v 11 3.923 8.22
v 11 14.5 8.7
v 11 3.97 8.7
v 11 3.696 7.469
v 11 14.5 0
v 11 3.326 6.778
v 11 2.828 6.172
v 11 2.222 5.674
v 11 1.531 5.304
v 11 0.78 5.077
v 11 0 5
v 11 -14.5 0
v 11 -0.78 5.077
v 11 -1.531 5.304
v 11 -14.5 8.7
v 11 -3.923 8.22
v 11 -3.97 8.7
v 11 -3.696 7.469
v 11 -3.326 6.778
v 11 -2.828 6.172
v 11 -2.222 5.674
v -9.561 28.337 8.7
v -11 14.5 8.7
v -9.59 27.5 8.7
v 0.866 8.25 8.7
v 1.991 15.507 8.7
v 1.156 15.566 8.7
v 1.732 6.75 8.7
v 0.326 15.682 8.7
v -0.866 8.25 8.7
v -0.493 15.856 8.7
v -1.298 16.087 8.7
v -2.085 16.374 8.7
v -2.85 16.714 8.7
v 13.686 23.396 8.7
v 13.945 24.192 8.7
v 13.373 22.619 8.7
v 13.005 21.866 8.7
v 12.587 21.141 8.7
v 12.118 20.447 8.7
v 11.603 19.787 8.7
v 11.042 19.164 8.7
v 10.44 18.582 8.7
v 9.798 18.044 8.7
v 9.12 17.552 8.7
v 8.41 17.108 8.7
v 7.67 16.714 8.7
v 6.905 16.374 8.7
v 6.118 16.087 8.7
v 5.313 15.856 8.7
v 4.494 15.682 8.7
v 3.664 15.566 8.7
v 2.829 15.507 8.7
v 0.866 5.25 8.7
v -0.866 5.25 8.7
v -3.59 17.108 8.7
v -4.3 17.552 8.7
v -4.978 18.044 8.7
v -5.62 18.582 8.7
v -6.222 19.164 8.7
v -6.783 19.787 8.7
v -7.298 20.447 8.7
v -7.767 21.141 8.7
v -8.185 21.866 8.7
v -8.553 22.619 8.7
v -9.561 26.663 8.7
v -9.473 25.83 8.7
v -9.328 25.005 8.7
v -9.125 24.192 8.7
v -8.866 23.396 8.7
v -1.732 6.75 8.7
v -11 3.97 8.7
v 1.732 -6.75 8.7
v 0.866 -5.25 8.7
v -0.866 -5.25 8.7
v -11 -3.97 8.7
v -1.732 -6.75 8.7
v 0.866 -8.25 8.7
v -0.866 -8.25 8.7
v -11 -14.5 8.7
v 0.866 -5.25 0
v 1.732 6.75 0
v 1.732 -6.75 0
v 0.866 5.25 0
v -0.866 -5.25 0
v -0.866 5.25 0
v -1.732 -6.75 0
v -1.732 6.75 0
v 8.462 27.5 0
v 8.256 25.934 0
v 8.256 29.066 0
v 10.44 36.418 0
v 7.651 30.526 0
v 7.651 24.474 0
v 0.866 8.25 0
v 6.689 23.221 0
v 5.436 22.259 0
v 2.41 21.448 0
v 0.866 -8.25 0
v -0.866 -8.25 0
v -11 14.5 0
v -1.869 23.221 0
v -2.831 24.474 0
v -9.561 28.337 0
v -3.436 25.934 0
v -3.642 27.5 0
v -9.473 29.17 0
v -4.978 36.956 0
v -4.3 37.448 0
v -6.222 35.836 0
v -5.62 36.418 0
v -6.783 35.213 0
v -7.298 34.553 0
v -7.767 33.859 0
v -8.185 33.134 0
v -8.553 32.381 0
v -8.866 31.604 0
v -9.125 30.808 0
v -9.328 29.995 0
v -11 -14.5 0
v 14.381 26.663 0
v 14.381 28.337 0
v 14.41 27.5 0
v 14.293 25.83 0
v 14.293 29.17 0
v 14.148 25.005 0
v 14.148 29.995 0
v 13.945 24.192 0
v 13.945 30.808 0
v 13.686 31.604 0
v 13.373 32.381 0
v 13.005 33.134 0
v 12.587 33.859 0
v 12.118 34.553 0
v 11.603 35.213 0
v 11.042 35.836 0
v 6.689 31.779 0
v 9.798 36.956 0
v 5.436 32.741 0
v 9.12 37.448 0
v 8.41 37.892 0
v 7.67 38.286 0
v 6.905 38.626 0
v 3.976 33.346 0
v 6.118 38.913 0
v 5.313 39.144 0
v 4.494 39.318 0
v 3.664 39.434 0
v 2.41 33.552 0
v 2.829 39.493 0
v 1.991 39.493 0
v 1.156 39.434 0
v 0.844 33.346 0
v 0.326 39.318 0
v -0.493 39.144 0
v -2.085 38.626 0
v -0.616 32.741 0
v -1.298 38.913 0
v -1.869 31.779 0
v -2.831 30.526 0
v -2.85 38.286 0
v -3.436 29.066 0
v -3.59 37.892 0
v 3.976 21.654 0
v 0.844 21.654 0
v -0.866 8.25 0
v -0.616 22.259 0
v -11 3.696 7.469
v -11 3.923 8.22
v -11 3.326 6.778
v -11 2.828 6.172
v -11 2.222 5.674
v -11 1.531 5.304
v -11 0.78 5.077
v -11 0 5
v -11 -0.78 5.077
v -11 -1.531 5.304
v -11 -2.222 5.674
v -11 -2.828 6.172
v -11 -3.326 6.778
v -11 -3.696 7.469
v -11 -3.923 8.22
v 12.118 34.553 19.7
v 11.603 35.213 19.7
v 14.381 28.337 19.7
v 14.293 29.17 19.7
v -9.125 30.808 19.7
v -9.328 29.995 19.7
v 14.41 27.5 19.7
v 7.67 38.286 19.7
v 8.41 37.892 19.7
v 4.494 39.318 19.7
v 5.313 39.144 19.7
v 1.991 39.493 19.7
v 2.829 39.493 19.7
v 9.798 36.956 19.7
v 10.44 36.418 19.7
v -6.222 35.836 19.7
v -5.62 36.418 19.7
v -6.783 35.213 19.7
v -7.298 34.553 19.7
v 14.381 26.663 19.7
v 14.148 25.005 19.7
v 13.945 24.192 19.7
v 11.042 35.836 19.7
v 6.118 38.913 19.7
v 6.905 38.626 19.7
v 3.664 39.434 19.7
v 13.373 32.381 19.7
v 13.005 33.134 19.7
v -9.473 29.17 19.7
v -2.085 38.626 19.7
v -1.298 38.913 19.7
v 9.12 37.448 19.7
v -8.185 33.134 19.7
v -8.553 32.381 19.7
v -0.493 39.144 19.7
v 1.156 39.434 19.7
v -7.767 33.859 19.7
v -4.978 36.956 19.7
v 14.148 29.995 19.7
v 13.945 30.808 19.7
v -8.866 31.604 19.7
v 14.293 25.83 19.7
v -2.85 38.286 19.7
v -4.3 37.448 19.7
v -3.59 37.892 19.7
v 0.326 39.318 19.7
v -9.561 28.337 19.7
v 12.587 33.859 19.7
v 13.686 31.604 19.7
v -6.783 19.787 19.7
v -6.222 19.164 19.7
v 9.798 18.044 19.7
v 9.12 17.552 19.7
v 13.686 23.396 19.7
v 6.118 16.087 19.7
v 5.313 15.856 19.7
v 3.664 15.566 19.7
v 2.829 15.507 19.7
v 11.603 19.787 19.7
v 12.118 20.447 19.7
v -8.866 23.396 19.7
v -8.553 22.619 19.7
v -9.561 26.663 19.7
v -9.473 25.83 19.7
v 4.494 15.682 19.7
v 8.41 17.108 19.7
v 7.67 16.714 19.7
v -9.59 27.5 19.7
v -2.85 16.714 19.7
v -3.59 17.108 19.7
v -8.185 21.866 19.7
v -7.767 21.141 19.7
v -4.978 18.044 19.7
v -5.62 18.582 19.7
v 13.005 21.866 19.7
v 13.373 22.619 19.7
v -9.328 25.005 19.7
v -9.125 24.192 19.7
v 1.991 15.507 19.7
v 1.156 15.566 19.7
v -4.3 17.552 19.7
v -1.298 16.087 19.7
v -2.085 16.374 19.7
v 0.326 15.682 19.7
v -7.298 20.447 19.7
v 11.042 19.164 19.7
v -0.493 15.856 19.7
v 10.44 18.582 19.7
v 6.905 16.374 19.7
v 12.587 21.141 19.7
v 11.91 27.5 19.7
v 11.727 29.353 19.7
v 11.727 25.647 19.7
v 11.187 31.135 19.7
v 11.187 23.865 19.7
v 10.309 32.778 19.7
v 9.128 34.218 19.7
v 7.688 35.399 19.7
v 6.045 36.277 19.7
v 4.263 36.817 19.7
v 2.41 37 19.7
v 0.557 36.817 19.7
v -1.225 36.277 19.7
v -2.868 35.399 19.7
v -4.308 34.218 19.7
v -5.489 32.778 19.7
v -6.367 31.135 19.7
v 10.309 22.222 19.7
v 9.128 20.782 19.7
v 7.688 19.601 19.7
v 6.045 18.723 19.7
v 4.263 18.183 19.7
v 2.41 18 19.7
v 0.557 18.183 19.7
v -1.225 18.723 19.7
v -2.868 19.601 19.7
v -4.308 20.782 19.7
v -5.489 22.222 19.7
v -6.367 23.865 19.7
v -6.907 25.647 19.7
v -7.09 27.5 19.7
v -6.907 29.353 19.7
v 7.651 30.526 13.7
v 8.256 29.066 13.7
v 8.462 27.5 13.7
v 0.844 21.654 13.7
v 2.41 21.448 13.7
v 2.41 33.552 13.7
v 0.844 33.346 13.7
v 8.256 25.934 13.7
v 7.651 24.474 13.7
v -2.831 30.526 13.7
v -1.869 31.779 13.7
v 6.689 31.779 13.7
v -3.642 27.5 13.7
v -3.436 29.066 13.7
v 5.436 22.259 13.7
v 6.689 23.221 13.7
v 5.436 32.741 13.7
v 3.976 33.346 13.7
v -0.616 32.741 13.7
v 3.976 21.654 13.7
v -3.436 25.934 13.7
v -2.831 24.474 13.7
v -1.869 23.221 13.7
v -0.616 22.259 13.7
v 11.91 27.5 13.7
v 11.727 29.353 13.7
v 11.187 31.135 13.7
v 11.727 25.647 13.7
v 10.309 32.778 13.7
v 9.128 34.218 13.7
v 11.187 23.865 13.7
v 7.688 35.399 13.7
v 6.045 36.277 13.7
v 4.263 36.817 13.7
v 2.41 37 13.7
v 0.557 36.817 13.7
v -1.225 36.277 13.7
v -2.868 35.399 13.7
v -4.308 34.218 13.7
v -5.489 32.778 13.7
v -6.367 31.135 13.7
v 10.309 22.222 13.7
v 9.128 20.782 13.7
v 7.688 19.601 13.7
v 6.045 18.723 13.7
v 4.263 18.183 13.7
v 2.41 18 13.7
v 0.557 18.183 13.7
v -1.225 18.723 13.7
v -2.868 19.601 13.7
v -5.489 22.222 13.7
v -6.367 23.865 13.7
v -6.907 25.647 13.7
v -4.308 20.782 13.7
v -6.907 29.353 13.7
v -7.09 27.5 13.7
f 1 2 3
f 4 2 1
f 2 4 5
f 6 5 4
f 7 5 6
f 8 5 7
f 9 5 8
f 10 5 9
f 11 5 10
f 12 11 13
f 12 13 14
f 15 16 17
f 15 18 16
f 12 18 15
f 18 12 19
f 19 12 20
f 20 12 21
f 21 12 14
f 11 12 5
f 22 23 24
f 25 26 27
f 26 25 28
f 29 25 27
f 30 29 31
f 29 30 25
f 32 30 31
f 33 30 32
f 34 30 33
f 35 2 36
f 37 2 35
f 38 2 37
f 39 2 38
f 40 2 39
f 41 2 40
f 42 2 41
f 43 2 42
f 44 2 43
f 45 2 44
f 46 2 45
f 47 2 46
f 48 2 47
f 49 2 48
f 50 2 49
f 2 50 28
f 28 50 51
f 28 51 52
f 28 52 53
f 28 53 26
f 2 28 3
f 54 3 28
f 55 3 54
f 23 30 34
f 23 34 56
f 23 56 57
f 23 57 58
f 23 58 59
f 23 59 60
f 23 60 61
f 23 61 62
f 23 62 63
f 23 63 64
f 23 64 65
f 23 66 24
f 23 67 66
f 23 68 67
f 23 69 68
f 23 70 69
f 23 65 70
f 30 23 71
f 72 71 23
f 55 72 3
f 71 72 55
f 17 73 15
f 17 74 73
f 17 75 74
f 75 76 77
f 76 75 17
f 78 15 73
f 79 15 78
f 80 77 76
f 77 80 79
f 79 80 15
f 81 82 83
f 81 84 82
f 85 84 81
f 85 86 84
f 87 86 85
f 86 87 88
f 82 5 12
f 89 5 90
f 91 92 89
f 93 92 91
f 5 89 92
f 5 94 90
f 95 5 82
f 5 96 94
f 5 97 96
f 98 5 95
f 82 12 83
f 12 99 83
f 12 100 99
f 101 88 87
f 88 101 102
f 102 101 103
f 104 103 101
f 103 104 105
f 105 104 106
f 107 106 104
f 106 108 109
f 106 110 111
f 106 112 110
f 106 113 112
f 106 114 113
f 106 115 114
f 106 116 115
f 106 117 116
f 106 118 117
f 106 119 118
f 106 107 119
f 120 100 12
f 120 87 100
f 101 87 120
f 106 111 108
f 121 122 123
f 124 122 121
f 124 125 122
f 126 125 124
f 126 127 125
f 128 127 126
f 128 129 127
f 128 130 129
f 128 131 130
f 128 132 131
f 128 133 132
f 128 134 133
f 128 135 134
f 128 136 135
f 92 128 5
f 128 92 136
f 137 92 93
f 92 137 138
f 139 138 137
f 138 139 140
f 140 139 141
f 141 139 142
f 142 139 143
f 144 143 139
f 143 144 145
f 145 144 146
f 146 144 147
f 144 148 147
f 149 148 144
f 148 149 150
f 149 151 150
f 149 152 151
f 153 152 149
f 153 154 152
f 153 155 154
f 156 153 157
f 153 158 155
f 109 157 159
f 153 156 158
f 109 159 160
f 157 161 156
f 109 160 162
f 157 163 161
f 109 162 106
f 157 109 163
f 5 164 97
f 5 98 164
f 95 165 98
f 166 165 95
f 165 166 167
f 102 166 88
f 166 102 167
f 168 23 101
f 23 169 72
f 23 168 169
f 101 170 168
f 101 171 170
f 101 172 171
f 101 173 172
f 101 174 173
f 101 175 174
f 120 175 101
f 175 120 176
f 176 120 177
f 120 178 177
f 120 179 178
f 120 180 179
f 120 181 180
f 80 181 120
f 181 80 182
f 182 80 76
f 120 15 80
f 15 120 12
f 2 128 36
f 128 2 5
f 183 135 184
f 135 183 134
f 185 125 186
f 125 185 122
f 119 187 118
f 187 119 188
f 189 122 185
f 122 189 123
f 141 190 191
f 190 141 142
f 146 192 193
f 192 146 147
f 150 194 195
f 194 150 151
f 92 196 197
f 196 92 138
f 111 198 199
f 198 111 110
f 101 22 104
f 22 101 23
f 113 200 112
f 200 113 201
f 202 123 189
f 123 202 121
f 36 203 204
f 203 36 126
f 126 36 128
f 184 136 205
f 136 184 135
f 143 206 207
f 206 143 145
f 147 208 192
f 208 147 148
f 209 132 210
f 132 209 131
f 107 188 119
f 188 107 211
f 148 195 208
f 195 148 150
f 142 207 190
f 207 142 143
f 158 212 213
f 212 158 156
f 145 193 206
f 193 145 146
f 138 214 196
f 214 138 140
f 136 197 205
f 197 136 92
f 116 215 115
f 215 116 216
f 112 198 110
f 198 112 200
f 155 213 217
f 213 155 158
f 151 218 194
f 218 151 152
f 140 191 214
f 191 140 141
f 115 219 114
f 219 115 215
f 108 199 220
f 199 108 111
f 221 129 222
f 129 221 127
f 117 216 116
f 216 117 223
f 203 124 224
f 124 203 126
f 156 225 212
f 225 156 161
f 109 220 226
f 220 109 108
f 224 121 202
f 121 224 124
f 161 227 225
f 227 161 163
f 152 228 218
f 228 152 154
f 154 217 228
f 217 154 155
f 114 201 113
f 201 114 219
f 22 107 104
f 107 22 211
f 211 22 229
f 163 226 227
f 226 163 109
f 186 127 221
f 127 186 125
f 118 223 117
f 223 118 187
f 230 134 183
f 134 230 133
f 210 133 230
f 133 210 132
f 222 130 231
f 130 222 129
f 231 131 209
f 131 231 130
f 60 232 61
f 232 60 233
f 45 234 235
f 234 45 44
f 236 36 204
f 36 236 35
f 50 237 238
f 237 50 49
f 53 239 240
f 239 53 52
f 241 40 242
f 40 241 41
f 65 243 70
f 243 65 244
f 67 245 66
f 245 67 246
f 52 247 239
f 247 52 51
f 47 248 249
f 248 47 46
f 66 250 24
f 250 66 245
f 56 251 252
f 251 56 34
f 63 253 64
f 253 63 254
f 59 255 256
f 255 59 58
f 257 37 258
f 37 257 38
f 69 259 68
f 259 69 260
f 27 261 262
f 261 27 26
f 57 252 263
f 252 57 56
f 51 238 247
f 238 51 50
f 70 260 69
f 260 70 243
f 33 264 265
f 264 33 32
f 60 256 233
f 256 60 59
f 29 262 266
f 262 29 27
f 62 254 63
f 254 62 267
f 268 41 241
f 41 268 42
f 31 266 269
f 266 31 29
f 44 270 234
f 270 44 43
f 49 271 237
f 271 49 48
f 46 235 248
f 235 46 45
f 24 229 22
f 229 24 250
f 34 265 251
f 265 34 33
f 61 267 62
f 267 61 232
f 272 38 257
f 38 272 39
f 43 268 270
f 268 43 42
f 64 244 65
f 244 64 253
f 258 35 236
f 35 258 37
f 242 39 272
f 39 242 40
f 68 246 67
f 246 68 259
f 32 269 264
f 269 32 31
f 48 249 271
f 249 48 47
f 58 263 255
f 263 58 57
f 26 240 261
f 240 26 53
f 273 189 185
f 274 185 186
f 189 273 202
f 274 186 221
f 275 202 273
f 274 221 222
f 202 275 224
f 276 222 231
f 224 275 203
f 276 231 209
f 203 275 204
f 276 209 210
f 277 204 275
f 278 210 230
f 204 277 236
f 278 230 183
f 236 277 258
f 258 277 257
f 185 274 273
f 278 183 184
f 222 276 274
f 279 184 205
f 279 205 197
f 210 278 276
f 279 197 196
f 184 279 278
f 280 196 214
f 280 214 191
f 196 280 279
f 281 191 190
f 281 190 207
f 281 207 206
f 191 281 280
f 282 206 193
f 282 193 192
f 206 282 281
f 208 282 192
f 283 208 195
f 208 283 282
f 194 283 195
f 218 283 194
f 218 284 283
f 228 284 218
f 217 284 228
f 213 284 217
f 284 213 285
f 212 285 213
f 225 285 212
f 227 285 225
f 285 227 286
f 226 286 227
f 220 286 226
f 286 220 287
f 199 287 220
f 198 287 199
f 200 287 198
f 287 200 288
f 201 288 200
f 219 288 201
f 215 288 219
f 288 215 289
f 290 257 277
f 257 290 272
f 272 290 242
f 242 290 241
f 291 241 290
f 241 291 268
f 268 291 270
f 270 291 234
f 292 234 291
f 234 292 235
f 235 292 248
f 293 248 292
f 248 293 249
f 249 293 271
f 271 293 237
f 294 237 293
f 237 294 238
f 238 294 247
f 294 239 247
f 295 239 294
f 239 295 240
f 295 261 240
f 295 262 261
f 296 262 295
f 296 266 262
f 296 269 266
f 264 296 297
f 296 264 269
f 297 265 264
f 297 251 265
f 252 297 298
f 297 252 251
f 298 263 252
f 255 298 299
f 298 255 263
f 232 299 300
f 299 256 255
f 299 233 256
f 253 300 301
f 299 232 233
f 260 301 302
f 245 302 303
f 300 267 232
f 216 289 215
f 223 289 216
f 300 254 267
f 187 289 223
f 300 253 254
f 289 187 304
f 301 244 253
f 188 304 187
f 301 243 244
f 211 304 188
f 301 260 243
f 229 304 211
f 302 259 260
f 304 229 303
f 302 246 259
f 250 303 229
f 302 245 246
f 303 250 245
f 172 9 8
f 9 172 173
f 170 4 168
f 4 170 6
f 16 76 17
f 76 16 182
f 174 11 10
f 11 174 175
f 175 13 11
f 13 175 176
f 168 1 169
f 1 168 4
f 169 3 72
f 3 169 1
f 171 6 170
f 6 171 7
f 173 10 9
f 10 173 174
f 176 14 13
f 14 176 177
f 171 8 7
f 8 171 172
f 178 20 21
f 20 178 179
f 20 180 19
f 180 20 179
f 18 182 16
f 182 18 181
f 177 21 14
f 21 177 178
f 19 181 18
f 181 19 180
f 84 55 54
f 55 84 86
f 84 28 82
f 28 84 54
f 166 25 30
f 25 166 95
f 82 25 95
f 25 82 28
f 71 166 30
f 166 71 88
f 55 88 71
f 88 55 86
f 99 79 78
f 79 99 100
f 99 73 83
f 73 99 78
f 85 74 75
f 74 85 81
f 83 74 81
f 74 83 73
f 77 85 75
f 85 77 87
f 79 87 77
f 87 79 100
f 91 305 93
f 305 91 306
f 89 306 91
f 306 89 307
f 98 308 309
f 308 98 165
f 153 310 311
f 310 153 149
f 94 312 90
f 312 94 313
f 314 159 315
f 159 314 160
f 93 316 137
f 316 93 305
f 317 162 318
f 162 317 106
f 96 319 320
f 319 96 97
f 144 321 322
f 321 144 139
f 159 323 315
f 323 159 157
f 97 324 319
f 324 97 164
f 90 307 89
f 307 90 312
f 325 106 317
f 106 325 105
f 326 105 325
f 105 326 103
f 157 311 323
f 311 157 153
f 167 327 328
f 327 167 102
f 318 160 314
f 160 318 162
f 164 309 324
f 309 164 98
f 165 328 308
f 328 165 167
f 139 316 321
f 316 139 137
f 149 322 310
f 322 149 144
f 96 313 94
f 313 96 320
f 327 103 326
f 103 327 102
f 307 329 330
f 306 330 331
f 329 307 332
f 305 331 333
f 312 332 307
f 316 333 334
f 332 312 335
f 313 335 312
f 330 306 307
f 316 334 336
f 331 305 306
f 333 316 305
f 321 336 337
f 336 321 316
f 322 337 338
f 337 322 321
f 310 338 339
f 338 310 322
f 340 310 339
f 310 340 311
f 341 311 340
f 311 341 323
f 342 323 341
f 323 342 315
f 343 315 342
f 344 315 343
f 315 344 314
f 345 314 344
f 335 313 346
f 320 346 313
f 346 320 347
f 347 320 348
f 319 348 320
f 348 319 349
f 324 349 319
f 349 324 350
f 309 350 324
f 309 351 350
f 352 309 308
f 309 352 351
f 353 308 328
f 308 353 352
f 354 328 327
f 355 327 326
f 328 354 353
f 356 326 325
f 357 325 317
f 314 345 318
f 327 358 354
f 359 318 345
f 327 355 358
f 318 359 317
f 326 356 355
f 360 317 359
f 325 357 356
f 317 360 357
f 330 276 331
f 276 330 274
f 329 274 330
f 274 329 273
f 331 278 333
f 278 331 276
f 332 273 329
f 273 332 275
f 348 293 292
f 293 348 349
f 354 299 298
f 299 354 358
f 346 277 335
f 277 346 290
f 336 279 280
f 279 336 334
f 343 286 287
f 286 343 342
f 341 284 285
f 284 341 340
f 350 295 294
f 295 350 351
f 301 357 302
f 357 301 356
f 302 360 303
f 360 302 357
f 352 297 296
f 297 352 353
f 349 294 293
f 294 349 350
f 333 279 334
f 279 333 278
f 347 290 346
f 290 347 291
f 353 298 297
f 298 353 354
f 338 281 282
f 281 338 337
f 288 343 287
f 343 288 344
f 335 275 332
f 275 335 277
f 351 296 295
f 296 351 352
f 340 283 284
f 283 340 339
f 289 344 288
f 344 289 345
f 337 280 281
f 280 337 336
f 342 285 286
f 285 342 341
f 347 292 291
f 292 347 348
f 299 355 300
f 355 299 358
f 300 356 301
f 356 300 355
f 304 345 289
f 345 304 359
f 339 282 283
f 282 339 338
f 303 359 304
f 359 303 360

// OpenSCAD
// file: polyhole.scad
// The Cylinder is dead! Long live the Cylinder!
// A module for a polyhole by radius, based on Nophead's work.

module polyhole(h, r, cent = false)
{
    n = max(round(4 * r), 3);
    cylinder(h = h, r = r / cos(180 / n), $fn = n, center = cent);
}
// main file
// XY Idler End

use<polyhole.scad>

XYIdlerEnd();

module XYIdlerEnd()
{
    heig = 5+19+5; //distance of bearing assembly and 5mm of platic on each side.
    widt = 25-3; //should be greater than (42.3+2+5)-(42.3/2+12.22/2+0.63+5).
    
    difference()
    {
        union()
        {
            translate([0, 0, (5+3.7)/2])
                cube([widt, heig, 5+3.7], center = true);
            hull()
            {
                translate([-widt/4, heig/2-1, (5+3.7)/2])
                    cube([widt/2, 2, 5+3.7], center = true);
                translate([widt/4, heig/2+1, (5+3.7)/2])
                    cube([widt/2, 2, 5+3.7], center = true);
                translate([-widt/2-3+(42.3+2+5)-(42.3/2+12.22/2+0.63+5), heig/2+1+19/2+2.5, 0])
                    cylinder(h = 5+3.7, r = 19/2+2.5, $fn = 90);
            }
            translate([-widt/2-3+((42.3+2+5)-(42.3/2+12.22/2+0.63+5)), heig/2+1+19/2+2.5, 0])
                cylinder(h = 5+3.7+5+6, r = 19/2+2.5, $fn = 90);
        }
        translate([0, 0, 5+4])
            rotate([0, 90, 0])
                cylinder(h = widt*2, r = 4, center = true, $fn = 32);
        translate([0, (19/2-5.5/2), 0])
            polyhole(h = 5+3.7, r = 1.5);
        translate([0, -(19/2-5.5/2), 0])
            polyhole(h = 5+3.7, r = 1.5);
        translate([-widt/2-3+((42.3+2+5)-(42.3/2+12.22/2+0.63+5)), heig/2+1+19/2+2.5, 0])
            polyhole(h = 5+3.7+5, r = 6);
        translate([-widt/2-3+((42.3+2+5)-(42.3/2+12.22/2+0.63+5)), heig/2+1+19/2+2.5, 5+3.7+5])
            cylinder(h = 5+3.7+5, r = 19/2, $fn = 32);
    }
}
